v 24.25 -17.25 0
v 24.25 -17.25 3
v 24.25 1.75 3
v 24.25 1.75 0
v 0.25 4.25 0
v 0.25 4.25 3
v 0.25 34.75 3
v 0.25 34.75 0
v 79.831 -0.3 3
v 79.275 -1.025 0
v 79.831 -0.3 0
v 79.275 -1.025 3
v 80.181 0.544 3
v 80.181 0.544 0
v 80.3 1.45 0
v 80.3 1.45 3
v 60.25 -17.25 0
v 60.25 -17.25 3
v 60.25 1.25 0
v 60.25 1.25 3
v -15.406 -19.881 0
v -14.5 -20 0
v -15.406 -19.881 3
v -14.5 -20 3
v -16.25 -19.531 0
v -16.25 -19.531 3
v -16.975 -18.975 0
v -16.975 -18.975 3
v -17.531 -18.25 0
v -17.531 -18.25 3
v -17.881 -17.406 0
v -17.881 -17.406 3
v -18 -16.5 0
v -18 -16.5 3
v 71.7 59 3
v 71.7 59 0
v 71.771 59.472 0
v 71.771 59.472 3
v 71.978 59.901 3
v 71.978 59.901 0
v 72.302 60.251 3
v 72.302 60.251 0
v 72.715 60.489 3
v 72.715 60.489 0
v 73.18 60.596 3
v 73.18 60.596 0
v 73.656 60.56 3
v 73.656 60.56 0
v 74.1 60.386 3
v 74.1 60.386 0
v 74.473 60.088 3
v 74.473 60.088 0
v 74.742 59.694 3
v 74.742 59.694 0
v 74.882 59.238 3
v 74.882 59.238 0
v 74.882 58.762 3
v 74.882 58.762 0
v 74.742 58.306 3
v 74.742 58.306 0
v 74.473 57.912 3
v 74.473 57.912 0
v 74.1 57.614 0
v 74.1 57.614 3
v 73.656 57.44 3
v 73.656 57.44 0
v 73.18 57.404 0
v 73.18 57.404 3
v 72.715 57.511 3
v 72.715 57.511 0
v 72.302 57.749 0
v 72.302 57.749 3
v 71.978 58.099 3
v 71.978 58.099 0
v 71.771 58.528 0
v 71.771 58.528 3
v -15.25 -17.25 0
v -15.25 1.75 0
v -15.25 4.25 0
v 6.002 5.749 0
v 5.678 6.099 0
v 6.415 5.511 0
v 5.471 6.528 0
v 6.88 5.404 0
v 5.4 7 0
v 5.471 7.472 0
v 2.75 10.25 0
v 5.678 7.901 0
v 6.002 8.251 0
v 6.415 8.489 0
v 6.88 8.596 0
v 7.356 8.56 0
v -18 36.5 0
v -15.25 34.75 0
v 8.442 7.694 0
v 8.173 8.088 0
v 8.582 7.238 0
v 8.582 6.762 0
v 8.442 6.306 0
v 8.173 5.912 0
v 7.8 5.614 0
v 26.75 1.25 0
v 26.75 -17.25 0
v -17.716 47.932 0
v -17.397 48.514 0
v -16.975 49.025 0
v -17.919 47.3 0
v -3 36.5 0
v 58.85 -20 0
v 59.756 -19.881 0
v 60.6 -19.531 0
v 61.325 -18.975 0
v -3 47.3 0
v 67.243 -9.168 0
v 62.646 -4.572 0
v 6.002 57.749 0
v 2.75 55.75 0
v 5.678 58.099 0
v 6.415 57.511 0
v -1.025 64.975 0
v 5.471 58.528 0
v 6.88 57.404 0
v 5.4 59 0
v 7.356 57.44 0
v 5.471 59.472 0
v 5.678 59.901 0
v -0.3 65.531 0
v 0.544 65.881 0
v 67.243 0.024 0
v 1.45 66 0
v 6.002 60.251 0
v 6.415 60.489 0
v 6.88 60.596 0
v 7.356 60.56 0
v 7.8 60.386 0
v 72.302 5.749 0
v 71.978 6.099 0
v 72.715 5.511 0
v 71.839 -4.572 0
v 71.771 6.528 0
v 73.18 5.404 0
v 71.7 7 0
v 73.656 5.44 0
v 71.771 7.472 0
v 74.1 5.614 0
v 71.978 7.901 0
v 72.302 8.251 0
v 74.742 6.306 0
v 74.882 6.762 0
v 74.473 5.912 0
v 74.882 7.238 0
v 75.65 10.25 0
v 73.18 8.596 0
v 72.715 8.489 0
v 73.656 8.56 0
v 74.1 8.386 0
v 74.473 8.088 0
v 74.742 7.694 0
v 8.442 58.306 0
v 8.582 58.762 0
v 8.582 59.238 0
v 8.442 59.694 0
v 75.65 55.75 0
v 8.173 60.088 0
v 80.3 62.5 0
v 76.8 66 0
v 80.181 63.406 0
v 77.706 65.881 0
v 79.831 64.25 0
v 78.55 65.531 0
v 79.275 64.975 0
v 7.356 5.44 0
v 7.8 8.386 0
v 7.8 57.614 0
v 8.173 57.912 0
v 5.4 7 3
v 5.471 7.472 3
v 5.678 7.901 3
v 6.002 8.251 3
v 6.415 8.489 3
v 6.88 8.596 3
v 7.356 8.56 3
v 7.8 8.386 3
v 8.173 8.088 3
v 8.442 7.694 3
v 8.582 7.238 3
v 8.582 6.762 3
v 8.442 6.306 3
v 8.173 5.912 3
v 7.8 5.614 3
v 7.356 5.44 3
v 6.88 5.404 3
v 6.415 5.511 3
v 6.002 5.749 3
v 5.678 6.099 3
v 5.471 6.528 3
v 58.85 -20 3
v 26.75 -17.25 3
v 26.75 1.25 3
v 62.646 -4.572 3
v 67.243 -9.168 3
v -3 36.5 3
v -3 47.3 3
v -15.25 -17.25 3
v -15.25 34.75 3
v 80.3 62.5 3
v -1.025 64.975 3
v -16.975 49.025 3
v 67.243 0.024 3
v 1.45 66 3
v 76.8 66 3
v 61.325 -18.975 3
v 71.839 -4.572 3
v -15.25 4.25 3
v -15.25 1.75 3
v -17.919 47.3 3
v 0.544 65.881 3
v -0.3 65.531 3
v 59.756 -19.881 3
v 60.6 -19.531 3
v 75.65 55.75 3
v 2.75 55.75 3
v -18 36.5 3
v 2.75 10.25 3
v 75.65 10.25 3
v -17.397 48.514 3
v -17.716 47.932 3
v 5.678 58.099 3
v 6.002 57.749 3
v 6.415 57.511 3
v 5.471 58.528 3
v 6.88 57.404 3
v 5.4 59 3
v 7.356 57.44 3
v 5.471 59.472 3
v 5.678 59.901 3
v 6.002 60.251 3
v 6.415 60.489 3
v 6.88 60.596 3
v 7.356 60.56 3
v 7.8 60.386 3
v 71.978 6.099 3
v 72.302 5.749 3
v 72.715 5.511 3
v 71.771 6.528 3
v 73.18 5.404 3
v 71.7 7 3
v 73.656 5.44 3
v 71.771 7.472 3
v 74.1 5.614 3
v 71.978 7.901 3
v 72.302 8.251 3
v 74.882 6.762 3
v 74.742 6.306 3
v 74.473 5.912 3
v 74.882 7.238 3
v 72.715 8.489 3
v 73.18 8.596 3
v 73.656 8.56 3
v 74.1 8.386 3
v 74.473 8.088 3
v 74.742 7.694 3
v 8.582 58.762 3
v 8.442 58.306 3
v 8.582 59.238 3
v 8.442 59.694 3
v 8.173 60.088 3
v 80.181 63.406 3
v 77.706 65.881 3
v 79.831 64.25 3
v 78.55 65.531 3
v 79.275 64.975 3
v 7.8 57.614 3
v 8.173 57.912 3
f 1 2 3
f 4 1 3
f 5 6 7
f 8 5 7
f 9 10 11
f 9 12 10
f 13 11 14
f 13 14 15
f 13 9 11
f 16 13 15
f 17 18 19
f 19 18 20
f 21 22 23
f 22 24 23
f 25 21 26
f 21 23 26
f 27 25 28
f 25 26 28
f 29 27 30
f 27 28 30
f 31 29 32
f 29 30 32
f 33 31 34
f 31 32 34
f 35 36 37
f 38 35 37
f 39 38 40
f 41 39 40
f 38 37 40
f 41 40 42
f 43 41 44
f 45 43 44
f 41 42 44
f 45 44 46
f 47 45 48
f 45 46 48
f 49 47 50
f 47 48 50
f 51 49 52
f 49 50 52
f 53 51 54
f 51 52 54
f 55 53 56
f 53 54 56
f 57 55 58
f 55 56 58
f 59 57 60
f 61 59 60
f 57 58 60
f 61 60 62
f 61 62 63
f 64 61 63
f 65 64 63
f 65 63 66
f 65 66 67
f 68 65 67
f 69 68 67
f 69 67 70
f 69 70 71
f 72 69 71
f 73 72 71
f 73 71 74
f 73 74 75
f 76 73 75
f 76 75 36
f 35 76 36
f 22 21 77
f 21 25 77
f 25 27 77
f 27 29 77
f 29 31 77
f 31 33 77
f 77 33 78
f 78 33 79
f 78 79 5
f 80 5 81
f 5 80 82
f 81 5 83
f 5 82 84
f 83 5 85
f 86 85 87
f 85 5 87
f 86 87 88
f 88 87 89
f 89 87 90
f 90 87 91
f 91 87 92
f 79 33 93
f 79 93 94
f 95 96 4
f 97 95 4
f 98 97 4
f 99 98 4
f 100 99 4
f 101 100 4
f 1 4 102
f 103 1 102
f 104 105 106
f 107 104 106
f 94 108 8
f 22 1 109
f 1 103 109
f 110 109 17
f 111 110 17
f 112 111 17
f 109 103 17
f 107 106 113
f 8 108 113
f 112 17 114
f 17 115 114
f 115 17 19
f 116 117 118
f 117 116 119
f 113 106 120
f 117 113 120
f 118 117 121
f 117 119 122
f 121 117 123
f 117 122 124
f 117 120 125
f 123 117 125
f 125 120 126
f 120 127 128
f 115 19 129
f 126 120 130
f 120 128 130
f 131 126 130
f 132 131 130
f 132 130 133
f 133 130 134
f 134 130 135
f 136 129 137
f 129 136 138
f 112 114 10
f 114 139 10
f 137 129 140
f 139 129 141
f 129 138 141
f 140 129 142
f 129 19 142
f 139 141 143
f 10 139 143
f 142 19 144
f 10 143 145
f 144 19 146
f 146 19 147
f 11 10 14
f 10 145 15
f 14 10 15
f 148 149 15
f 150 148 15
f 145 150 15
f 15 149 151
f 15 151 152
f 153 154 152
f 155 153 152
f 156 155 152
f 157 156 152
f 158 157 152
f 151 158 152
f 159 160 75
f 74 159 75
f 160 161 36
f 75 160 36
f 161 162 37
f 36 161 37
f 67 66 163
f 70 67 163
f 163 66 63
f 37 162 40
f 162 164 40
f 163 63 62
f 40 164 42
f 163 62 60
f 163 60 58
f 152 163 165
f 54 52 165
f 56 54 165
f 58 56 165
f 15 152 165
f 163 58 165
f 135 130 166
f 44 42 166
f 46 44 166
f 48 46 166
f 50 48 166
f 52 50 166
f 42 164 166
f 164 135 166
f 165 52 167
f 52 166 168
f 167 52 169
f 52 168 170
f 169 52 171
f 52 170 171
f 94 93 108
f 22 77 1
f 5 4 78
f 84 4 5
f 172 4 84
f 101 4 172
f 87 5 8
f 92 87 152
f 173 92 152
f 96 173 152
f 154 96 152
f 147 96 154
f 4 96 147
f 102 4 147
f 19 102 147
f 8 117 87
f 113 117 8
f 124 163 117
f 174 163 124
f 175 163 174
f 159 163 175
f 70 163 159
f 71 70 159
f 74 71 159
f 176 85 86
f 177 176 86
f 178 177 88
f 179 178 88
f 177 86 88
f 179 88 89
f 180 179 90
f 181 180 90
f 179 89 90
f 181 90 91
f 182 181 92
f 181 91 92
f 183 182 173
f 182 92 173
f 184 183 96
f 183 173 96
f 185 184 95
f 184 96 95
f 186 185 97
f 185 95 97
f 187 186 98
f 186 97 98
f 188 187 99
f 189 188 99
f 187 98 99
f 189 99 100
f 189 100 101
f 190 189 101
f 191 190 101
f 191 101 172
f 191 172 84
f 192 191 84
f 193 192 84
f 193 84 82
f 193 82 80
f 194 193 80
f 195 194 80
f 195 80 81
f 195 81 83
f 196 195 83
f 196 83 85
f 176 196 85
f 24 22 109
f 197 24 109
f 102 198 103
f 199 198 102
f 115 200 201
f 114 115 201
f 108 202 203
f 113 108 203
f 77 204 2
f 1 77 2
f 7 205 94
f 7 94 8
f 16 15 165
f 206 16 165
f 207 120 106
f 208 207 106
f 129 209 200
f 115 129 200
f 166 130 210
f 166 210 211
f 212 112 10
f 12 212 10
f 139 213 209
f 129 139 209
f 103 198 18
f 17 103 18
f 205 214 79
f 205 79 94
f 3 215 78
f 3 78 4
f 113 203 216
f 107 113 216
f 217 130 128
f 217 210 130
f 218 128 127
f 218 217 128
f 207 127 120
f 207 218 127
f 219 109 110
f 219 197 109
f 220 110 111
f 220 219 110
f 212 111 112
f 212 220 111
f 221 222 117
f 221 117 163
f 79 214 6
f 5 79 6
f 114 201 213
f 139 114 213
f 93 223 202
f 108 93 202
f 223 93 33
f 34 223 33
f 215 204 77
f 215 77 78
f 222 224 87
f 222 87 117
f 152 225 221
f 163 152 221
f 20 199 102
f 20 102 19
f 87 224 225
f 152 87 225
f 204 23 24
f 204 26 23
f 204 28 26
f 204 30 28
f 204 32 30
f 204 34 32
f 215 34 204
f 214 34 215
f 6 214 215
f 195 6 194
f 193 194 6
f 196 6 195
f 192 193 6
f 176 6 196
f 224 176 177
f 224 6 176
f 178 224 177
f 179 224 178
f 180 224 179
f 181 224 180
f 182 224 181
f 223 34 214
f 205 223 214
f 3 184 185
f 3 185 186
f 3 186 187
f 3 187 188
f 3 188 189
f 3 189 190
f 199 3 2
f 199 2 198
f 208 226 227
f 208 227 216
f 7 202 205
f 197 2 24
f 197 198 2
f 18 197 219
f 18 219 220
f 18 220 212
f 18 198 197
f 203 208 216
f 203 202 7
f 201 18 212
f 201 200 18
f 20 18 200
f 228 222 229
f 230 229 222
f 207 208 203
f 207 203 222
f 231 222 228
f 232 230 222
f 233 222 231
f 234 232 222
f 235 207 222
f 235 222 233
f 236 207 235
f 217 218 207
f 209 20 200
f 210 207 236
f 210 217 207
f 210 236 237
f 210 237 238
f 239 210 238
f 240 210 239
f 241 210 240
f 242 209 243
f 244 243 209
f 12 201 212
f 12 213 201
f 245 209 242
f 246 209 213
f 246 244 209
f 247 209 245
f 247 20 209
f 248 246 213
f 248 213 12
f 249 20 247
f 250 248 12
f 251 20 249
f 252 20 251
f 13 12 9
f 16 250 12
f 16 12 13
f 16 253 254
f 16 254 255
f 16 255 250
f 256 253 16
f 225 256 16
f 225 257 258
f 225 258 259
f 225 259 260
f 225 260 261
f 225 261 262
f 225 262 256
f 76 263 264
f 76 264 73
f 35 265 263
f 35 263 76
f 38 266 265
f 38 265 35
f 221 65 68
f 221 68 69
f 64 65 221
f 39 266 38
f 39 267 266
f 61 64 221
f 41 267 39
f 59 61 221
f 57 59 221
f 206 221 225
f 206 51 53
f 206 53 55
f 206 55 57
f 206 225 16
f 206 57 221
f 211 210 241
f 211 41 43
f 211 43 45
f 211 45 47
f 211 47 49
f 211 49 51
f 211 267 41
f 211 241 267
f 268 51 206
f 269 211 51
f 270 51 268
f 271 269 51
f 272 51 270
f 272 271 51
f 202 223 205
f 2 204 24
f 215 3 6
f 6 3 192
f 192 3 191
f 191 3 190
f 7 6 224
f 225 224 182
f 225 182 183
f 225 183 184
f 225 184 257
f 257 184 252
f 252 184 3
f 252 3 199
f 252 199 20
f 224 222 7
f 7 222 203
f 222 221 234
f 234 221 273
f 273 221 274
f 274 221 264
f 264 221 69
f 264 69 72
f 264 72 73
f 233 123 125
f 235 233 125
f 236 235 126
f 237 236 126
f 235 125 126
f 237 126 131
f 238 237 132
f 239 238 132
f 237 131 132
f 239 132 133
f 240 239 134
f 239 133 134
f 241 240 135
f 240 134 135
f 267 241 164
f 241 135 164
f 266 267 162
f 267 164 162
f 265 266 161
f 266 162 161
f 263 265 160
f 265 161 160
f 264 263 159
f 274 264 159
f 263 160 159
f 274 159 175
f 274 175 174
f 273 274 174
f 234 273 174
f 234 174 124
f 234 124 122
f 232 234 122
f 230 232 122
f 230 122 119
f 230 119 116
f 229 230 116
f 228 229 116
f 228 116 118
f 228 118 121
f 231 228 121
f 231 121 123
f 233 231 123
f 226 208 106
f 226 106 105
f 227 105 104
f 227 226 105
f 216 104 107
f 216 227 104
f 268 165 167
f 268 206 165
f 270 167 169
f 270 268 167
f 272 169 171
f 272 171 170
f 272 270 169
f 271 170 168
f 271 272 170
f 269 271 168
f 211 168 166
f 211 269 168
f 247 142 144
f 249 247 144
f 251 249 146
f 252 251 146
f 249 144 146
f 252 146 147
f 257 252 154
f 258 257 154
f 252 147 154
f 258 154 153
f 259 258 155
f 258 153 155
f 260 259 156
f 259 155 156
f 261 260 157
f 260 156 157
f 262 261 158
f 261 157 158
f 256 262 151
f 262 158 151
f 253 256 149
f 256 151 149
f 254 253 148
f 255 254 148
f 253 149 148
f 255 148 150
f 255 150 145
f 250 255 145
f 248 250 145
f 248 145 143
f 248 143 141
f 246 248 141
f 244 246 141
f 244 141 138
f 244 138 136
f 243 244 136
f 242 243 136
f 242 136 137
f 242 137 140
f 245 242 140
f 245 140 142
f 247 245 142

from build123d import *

# Parameters (mm, degrees)
BOSS_EXTRUDE1_DEPTH        = 3
FILLET1_R                  = 3.5
SKETCH2_W                  = 72.4
SKETCH2_H                  = 45
CUT_EXTRUDE1_DEPTH         = 104.986008674
SKETCH3_W                  = 33
SKETCH3_H                  = 18
SKETCH3_W_2                = 39
SKETCH3_H_2                = 18.5
SKETCH3_W_3                = 15
SKETCH3_H_3                = 30
CUT_EXTRUDE2_DEPTH         = 104.986008674
F_3_2_3_2_DIAMETER_HOLE1_D = 3.2
SKETCH9_W                  = 72.9
SKETCH9_H                  = 45.5
SKETCH9_W_2                = 33.5
SKETCH9_H_2                = 18.5
SKETCH9_W_3                = 39.5
SKETCH9_H_3                = 19
SKETCH9_W_4                = 15.5
SKETCH9_H_4                = 30.5
CUT_EXTRUDE3_DEPTH         = 104.986008674


with BuildPart() as part:
    # Sketch1 → Boss-Extrude1 (new body)
    with BuildSketch(Plane.XY):
        Polygon((60.3, -20), (80.3, 0), (80.3, 66), (0, 66), (-18, 48), (-18, -20), align=None)
    extrude(amount=BOSS_EXTRUDE1_DEPTH)

    # Fillet1
    fillet1_edges = [part.edges().sort_by_distance(p)[0] for p in [
        (80.3, 0, 1.5),
        (60.3, -20, 1.5),
        (-18, -20, 1.5),
        (-18, 48, 1.5),
        (80.3, 66, 1.5),
        (0, 66, 1.5),
    ]]
    fillet(fillet1_edges, radius=FILLET1_R)

    # Sketch2 → Cut-Extrude1 (cut, through all)
    with BuildSketch(Plane.XY.offset(3)):
        with Locations((39.2, 33)):
            Rectangle(SKETCH2_W, SKETCH2_H)
    extrude(amount=-CUT_EXTRUDE1_DEPTH, mode=Mode.SUBTRACT)

    # Sketch3 → Cut-Extrude2 (cut, through all)
    with BuildSketch(Plane.XY.offset(3)):
        with Locations((43.5, -8)):
            Rectangle(SKETCH3_W, SKETCH3_H)
        with Locations((4.5, -7.75)):
            Rectangle(SKETCH3_W_2, SKETCH3_H_2)
        with Locations((-7.5, 19.5)):
            Rectangle(SKETCH3_W_3, SKETCH3_H_3)
        with BuildLine():
            Line((-3, 47.3), (-17.918753974, 47.3))
            ThreePointArc((-17.918753974, 47.3), (-17.979629212, 46.927320889), (-18, 46.550252532))
            Line((-18, 46.550252532), (-18, 36.5))
            Line((-18, 36.5), (-3, 36.5))
            Line((-3, 36.5), (-3, 47.3))
        make_face()
        Polygon((63, -4.572077939), (67.242640687, -8.814718626), (71.485281374, -4.572077939), (67.242640687, -0.329437252), align=None)
    extrude(amount=-CUT_EXTRUDE2_DEPTH, mode=Mode.SUBTRACT)

    # Ø3.2 (3.2) Diameter Hole1 (through all)
    with Locations(Plane.XY.offset(3)):
        with Locations((7, 59), (73.3, 59), (73.3, 7), (7, 7)):
            Hole(F_3_2_3_2_DIAMETER_HOLE1_D / 2)

    # Sketch9 → Cut-Extrude3 (cut, through all)
    with BuildSketch(Plane.XY.offset(3)):
        with Locations((39.2, 33)):
            Rectangle(SKETCH9_W, SKETCH9_H)
        with Locations((43.5, -8)):
            Rectangle(SKETCH9_W_2, SKETCH9_H_2)
        Polygon((67.242640687, -9.168272016), (71.838834765, -4.572077939), (67.242640687, 0.024116139), (62.646446609, -4.572077939), align=None)
        with Locations((4.5, -7.75)):
            Rectangle(SKETCH9_W_3, SKETCH9_H_3)
        with Locations((-7.5, 19.5)):
            Rectangle(SKETCH9_W_4, SKETCH9_H_4)
    extrude(amount=-CUT_EXTRUDE3_DEPTH, mode=Mode.SUBTRACT)


solid = part.part
